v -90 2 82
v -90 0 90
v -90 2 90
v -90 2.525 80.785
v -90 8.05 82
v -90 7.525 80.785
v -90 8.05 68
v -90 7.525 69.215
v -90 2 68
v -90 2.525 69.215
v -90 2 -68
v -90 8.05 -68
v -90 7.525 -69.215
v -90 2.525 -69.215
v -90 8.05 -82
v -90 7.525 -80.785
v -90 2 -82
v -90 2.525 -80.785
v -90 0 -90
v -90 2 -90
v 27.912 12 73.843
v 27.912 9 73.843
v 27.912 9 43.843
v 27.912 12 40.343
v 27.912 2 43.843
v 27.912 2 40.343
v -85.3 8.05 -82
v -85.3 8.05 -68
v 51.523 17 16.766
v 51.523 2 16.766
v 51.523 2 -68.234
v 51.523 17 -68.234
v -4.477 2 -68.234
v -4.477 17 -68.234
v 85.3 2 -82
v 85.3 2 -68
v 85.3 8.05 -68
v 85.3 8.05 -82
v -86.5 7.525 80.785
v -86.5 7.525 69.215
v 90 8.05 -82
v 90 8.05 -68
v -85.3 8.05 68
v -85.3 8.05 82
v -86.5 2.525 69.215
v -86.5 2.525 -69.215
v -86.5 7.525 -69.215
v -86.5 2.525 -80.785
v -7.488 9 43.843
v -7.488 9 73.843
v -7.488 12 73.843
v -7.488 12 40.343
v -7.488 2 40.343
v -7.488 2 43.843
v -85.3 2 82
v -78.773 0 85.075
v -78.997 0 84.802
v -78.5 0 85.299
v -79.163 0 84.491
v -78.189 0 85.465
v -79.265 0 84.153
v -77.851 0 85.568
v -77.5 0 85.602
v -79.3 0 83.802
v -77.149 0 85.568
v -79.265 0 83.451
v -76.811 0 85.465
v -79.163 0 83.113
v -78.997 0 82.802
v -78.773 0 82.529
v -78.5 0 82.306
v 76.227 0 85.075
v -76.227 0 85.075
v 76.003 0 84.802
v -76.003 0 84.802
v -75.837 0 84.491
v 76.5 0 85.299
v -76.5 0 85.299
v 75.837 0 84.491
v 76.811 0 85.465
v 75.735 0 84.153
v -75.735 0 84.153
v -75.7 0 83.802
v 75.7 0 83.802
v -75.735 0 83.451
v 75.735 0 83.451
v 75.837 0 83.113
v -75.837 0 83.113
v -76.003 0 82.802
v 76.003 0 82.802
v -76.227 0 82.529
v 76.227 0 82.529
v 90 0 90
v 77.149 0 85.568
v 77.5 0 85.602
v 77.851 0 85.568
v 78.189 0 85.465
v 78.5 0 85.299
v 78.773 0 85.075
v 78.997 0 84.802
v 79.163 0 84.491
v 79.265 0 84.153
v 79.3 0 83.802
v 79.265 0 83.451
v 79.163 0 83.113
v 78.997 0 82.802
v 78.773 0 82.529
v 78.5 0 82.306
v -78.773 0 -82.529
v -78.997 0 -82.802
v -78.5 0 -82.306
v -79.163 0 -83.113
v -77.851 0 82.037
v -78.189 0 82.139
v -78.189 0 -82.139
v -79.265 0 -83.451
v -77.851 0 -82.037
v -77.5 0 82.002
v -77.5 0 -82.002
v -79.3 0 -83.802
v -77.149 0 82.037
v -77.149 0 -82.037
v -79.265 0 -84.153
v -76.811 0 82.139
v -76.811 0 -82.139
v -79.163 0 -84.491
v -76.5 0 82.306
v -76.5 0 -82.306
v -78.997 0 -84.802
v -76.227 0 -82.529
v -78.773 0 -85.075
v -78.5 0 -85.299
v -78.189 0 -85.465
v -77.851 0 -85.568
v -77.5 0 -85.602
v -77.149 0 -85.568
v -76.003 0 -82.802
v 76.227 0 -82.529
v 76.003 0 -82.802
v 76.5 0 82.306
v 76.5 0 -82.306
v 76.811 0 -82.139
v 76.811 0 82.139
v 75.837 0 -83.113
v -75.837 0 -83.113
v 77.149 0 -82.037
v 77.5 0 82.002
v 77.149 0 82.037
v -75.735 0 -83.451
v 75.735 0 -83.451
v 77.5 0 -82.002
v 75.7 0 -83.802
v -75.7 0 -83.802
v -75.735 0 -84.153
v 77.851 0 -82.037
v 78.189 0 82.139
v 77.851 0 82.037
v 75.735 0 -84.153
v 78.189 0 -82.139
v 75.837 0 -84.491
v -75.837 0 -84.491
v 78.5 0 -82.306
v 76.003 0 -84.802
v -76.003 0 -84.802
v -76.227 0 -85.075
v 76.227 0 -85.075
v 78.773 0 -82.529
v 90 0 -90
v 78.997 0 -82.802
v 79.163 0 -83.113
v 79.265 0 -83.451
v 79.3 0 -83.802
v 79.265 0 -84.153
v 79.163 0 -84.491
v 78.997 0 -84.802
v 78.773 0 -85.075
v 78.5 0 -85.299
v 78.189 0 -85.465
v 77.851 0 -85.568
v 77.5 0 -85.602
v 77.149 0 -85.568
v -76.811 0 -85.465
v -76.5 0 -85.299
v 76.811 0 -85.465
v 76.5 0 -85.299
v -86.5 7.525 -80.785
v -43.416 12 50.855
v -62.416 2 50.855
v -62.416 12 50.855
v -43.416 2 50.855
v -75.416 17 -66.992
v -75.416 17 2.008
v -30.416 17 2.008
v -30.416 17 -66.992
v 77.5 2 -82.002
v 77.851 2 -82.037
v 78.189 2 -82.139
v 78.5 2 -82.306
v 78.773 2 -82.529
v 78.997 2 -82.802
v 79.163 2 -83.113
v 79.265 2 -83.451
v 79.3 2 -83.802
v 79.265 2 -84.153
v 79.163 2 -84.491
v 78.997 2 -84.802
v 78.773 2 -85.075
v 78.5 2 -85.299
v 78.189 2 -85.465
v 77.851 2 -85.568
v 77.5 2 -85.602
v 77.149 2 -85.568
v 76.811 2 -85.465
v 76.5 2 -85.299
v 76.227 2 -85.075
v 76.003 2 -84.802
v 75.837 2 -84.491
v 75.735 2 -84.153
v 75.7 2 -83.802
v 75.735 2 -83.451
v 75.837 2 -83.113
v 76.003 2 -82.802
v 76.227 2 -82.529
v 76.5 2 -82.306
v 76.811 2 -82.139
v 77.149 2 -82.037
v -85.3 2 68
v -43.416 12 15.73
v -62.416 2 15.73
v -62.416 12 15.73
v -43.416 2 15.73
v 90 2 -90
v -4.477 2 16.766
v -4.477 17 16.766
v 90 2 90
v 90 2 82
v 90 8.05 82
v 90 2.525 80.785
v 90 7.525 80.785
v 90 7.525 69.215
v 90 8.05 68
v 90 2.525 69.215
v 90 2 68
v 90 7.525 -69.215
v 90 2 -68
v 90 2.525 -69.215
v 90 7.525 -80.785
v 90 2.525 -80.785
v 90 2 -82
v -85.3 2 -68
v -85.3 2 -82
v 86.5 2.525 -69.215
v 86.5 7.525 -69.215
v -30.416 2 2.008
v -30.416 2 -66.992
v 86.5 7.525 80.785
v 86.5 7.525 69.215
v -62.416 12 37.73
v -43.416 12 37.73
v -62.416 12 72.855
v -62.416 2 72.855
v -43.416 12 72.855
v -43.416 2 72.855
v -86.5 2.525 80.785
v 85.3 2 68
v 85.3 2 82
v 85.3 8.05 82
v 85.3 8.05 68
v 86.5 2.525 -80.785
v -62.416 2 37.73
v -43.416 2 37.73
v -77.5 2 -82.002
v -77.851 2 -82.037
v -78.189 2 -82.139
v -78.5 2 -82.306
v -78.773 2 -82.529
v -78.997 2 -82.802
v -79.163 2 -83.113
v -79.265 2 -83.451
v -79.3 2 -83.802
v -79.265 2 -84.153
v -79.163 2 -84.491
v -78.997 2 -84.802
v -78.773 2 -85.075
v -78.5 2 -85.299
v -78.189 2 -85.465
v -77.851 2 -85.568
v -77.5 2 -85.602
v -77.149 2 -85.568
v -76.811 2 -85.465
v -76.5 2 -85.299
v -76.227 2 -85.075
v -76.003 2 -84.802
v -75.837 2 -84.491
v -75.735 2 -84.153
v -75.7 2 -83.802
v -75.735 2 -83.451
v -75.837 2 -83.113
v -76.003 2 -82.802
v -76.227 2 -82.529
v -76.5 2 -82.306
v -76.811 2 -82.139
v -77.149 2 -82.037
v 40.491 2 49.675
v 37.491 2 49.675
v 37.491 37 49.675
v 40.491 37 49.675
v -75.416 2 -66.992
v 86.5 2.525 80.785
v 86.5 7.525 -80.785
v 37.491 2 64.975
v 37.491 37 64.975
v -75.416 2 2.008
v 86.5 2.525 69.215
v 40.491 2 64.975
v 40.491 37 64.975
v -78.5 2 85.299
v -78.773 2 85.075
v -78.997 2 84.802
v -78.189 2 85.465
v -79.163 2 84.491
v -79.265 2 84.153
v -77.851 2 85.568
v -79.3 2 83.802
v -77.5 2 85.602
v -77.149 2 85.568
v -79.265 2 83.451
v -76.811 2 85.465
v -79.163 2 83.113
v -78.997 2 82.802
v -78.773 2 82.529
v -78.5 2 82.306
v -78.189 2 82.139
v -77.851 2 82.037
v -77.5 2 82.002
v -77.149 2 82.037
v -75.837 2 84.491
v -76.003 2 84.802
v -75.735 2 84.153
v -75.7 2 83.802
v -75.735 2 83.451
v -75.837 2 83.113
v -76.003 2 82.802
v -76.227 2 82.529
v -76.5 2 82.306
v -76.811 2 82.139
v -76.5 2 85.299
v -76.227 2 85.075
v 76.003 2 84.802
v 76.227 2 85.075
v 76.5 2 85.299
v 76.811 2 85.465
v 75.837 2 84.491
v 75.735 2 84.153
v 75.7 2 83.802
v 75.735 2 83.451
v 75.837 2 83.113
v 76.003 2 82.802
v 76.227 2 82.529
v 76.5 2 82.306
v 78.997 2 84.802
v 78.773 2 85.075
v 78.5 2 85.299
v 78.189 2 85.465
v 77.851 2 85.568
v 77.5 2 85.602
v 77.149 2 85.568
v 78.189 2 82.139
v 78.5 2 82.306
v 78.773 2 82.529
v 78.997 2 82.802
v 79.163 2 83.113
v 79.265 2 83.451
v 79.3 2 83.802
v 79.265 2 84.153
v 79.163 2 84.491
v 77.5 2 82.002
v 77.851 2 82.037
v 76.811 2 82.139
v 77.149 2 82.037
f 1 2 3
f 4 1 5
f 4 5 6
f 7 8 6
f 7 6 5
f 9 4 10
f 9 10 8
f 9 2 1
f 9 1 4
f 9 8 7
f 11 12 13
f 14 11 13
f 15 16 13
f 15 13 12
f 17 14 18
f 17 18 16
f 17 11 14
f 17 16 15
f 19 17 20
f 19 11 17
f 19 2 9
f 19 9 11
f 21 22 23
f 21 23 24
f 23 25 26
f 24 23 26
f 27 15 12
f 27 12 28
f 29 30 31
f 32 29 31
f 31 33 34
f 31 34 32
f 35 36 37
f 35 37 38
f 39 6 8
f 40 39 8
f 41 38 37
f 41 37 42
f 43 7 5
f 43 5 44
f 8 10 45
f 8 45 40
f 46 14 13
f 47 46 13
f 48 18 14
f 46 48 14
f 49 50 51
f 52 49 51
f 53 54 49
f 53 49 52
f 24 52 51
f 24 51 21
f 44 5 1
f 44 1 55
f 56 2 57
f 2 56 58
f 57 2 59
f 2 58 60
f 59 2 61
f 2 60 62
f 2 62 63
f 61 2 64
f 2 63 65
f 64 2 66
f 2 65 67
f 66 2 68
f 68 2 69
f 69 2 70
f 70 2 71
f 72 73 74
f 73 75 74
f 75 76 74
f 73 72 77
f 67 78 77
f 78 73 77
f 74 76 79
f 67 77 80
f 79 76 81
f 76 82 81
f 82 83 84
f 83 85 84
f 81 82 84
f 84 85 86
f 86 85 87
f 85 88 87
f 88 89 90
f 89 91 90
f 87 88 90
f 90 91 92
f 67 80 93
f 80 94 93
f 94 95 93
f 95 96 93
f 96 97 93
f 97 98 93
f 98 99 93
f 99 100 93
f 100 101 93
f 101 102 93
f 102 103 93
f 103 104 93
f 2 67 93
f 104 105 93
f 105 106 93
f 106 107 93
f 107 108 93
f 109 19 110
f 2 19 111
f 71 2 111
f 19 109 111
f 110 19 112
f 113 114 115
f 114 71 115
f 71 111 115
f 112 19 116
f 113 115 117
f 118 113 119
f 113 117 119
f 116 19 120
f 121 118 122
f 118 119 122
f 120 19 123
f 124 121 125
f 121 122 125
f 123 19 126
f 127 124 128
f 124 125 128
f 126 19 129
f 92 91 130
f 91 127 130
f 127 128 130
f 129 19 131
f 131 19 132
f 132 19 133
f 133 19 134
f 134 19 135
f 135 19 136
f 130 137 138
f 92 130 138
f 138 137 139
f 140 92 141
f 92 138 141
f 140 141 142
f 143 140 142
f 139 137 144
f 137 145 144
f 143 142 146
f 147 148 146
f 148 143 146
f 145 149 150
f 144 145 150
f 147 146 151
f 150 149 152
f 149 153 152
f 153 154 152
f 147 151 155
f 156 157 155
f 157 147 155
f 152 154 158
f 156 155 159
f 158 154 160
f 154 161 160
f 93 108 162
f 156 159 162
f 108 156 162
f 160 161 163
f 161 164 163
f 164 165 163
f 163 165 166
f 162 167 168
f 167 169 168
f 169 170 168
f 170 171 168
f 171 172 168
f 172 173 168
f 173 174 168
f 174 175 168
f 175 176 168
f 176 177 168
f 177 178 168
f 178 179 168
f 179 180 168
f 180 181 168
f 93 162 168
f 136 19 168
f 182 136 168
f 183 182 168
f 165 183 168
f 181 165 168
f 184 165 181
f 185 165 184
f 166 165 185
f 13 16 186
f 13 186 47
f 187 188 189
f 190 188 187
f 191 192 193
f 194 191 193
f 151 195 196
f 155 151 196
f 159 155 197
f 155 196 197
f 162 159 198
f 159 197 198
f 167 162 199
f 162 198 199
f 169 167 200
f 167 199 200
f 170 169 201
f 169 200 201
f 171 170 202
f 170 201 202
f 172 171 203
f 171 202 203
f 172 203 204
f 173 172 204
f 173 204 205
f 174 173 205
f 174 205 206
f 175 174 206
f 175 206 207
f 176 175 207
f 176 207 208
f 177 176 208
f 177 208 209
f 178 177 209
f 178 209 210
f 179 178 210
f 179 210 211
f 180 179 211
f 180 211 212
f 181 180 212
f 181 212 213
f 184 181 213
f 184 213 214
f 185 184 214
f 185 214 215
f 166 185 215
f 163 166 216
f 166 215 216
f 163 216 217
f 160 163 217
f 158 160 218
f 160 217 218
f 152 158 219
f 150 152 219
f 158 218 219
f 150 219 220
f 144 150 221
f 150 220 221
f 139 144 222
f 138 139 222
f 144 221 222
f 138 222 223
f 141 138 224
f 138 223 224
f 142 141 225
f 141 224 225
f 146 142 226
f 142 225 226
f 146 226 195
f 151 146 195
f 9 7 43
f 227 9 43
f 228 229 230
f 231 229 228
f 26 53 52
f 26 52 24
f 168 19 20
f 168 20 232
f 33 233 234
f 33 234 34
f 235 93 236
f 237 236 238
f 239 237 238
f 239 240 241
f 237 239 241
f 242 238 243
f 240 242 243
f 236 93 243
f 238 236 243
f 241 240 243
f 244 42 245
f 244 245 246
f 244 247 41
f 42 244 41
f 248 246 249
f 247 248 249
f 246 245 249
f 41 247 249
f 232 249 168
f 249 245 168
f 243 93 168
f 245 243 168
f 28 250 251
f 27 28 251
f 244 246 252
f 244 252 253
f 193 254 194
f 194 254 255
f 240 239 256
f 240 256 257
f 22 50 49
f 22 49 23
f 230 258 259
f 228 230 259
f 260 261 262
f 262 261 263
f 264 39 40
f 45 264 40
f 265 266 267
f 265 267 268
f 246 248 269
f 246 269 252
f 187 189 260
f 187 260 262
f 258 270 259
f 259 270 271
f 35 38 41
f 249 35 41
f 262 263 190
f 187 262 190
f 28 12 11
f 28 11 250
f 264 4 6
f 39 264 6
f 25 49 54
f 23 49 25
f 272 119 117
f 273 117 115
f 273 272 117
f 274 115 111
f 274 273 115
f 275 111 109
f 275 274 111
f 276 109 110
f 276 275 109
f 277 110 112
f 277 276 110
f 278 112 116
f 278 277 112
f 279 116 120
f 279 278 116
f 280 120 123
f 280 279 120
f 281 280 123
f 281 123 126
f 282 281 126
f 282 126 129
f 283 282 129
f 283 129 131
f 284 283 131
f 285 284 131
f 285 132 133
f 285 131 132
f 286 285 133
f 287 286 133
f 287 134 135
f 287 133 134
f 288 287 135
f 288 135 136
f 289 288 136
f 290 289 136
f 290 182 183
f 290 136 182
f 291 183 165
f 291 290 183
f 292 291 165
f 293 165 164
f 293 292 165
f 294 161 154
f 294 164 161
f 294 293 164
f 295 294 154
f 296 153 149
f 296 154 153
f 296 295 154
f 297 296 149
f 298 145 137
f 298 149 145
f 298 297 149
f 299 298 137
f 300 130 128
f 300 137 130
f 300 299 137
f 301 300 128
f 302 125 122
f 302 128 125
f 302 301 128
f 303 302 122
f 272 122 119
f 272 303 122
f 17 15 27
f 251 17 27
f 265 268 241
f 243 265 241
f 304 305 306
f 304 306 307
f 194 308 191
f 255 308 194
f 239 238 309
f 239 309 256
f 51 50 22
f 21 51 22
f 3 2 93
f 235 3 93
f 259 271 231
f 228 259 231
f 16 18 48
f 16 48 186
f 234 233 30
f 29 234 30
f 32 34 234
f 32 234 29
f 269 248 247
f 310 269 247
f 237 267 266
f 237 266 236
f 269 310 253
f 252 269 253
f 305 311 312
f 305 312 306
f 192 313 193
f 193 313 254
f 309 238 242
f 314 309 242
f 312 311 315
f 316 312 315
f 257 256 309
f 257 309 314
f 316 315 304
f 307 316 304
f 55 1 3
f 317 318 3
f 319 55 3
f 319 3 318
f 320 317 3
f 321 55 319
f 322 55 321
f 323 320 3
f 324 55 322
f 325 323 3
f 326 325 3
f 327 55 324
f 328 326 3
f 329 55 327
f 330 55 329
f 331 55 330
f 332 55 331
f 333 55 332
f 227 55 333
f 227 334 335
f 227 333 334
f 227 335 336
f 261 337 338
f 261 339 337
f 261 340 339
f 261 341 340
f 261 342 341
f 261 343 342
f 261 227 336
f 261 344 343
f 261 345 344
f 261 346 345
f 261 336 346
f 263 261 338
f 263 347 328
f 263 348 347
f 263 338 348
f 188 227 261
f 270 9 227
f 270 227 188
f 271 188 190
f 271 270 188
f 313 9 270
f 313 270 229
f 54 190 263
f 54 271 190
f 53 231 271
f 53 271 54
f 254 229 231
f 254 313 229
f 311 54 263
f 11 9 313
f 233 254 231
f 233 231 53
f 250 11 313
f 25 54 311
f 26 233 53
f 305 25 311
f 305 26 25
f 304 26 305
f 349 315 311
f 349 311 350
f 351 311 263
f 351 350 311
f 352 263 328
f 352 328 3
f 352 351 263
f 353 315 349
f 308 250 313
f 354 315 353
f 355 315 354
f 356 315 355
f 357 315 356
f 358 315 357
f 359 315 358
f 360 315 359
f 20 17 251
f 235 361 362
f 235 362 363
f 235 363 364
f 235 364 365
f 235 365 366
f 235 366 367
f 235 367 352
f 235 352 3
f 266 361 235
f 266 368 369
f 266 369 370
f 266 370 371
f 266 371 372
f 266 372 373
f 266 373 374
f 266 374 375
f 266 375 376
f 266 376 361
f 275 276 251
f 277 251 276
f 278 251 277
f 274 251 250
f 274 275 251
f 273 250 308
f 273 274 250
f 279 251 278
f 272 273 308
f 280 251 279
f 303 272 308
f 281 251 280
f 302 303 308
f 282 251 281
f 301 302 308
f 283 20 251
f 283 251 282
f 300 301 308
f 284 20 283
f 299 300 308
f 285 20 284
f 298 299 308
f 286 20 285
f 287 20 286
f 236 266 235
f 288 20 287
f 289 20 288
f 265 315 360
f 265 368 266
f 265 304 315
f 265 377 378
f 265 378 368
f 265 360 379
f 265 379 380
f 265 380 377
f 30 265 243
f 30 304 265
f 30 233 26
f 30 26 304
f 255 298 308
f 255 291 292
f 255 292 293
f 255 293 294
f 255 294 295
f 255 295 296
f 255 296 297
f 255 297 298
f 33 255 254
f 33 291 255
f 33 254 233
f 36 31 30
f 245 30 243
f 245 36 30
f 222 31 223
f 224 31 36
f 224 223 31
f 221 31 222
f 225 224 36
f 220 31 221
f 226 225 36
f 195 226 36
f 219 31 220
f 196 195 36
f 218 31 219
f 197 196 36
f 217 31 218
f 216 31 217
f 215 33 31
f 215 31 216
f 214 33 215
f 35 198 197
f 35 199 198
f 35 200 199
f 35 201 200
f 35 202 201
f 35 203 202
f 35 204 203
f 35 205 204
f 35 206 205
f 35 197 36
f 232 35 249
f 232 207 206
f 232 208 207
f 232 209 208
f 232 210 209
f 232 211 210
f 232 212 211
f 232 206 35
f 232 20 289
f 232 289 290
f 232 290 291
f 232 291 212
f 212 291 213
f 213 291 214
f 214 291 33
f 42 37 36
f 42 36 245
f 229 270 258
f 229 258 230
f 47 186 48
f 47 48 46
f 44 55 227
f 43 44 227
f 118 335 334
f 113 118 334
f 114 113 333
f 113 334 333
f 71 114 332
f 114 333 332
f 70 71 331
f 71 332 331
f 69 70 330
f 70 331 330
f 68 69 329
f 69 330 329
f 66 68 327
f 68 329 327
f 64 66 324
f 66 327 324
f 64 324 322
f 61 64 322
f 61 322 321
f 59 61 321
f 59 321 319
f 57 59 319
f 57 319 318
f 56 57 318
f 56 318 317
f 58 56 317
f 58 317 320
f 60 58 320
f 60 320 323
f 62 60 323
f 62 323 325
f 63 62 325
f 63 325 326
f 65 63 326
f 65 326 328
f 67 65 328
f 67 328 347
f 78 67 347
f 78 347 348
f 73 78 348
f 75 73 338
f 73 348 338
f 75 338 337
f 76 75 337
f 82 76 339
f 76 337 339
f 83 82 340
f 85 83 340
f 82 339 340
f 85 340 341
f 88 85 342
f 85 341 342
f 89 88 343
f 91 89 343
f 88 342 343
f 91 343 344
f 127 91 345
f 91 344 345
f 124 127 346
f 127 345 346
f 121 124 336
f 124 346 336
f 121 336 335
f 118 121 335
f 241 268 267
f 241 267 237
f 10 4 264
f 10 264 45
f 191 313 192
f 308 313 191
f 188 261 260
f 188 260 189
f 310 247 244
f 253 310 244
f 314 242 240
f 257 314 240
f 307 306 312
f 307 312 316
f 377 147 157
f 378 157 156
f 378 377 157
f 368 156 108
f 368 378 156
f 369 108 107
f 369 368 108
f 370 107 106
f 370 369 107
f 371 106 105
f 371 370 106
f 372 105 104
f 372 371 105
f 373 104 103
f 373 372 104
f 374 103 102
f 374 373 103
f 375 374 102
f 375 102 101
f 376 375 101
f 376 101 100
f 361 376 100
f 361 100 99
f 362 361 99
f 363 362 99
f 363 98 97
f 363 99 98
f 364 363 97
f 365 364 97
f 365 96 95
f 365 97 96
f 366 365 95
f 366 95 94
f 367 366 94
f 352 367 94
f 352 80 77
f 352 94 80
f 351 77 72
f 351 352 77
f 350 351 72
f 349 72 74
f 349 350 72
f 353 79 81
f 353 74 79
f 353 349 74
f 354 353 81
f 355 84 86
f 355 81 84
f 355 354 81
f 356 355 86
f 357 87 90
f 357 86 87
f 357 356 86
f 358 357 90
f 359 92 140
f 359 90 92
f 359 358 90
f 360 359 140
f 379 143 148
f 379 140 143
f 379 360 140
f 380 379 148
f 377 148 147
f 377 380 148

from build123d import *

# Parameters (mm, degrees)
SKETCH_1_W                                 = 180
SKETCH_1_H                                 = 180
EXTRUDE_1_DEPTH                            = 2
SKETCH_2_W                                 = 4.7
SKETCH_2_H                                 = 14
EXTRUDE_2_DEPTH                            = 6.05
SKETCH_3_W                                 = 11.570247934
SKETCH_3_H                                 = 5
CUT_EXTRUDE_1_DEPTH                        = 3.5
MIRROR_1_AT_THE_SECOND_PLANE_COPY_1_SKET_W = 11.570247934
MIRROR_1_AT_THE_SECOND_PLANE_COPY_1_SKET_H = 5
MIRROR_1_AT_THE_SECOND_PLANE_COPY_1_DEPTH  = 3.5
SKETCH_4_W                                 = 45
SKETCH_4_H                                 = 69
EXTRUDE_3_DEPTH                            = 15
SKETCH_5_W                                 = 19
SKETCH_5_H                                 = 22
EXTRUDE_4_DEPTH                            = 10
SKETCH_6_W                                 = 56
SKETCH_6_H                                 = 85
EXTRUDE_5_DEPTH                            = 15
SKETCH_7_W                                 = 35.4
SKETCH_7_H                                 = 33.5
EXTRUDE_6_DEPTH                            = 10
SKETCH_8_W                                 = 35.4
SKETCH_8_H                                 = 7
CUT_EXTRUDE_6_DEPTH                        = 30
SKETCH_9_W                                 = 3
SKETCH_9_H                                 = 15.3
EXTRUDE_7_DEPTH                            = 35
SKETCH_10_R                                = 1.8
CUT_EXTRUDE_7_DEPTH                        = 10
MIRROR_3_AT_THE_SECOND_PLANE_COPY_1_SKET_R = 1.8
MIRROR_3_AT_THE_SECOND_PLANE_COPY_1_DEPTH  = 10


with BuildPart() as part:
    # 草图1 → 凸台-拉伸1 (new body)
    with BuildSketch(Plane(origin=(0, 0, 0), x_dir=(1, 0, 0), z_dir=(0, 1, 0))):
        Rectangle(SKETCH_1_W, SKETCH_1_H)
    extrude(amount=EXTRUDE_1_DEPTH)

    # 草图2 → 凸台-拉伸2 (add)
    with BuildSketch(Plane(origin=(0, 2, 0), x_dir=(1, 0, 0), z_dir=(0, 1, 0))):
        with Locations((-87.65, 75)):
            Rectangle(SKETCH_2_W, SKETCH_2_H)
        with Locations((-87.65, -75)):
            Rectangle(SKETCH_2_W, SKETCH_2_H)
        with Locations((87.65, -75)):
            Rectangle(SKETCH_2_W, SKETCH_2_H)
        with Locations((87.65, 75)):
            Rectangle(SKETCH_2_W, SKETCH_2_H)
    extrude(amount=EXTRUDE_2_DEPTH)

    # 草图3 → 切除-拉伸1 (cut)
    with BuildSketch(Plane.ZY.offset(90)):
        with Locations((-75, 5.025)):
            Rectangle(SKETCH_3_W, SKETCH_3_H)
    cut_extrude_1 = extrude(amount=-CUT_EXTRUDE_1_DEPTH, mode=Mode.SUBTRACT)

    # 镜向1: 切除-拉伸1 across plane
    add(cut_extrude_1.mirror(Plane(origin=(0, 0, 0), x_dir=(0, 0, 1), z_dir=(1, 0, 0))), mode=Mode.SUBTRACT)

    # 镜向1 at the second plane: 切除-拉伸1 across plane
    add(cut_extrude_1.mirror(Plane.XY), mode=Mode.SUBTRACT)

    # 镜向1 at the second plane copy 1 sket → 镜向1 at the second plane copy 1 (cut)
    with BuildSketch(Plane(origin=(90, 0, 0), x_dir=(0, 0, -1), z_dir=(1, 0, 0))):
        with Locations((-75, 5.025)):
            Rectangle(MIRROR_1_AT_THE_SECOND_PLANE_COPY_1_SKET_W, MIRROR_1_AT_THE_SECOND_PLANE_COPY_1_SKET_H)
    extrude(amount=-MIRROR_1_AT_THE_SECOND_PLANE_COPY_1_DEPTH, mode=Mode.SUBTRACT)

    # 草图4 → 凸台-拉伸3 (add)
    with BuildSketch(Plane(origin=(0, 2, 0), x_dir=(1, 0, 0), z_dir=(0, 1, 0))):
        with Locations((-52.915832737, 32.492177997)):
            Rectangle(SKETCH_4_W, SKETCH_4_H)
    extrude(amount=EXTRUDE_3_DEPTH)

    # 草图5 → 凸台-拉伸4 (add)
    with BuildSketch(Plane(origin=(0, 2, 0), x_dir=(1, 0, 0), z_dir=(0, 1, 0))):
        with Locations((-52.915832737, -26.729978553)):
            Rectangle(SKETCH_5_W, SKETCH_5_H)
        with Locations((-52.915832737, -61.854870093)):
            Rectangle(SKETCH_5_W, SKETCH_5_H)
    extrude(amount=EXTRUDE_4_DEPTH)

    # 草图6 → 凸台-拉伸5 (add)
    with BuildSketch(Plane(origin=(0, 2, 0), x_dir=(1, 0, 0), z_dir=(0, 1, 0))):
        with Locations((23.523310823, 25.733573793)):
            Rectangle(SKETCH_6_W, SKETCH_6_H)
    extrude(amount=EXTRUDE_5_DEPTH)

    # 草图7 → 凸台-拉伸6 (add)
    with BuildSketch(Plane(origin=(0, 2, 0), x_dir=(1, 0, 0), z_dir=(0, 1, 0))):
        with Locations((10.21182737, -57.09339848)):
            Rectangle(SKETCH_7_W, SKETCH_7_H)
    extrude(amount=EXTRUDE_6_DEPTH)

    # 草图8 → 切除-拉伸6 (cut)
    with BuildSketch(Plane.XY.offset(73.84339848)):
        with Locations((10.21182737, 5.5)):
            Rectangle(SKETCH_8_W, SKETCH_8_H)
    extrude(amount=-CUT_EXTRUDE_6_DEPTH, mode=Mode.SUBTRACT)

    # 草图9 → 凸台-拉伸7 (add)
    with BuildSketch(Plane(origin=(0, 2, 0), x_dir=(1, 0, 0), z_dir=(0, 1, 0))):
        with Locations((38.990613596, -57.325485465)):
            Rectangle(SKETCH_9_W, SKETCH_9_H)
    extrude(amount=EXTRUDE_7_DEPTH)

    # 草图10 → 切除-拉伸7 (cut)
    with BuildSketch(Plane(origin=(0, 2, 0), x_dir=(1, 0, 0), z_dir=(0, 1, 0))):
        with Locations(Location((77.5, 83.802246308, 0), (0, 0, 270))):
            Circle(SKETCH_10_R)
    cut_extrude_7 = extrude(amount=-CUT_EXTRUDE_7_DEPTH, mode=Mode.SUBTRACT)

    # 镜向3: 切除-拉伸7 across plane
    add(cut_extrude_7.mirror(Plane(origin=(0, 0, 0), x_dir=(0, 0, 1), z_dir=(1, 0, 0))), mode=Mode.SUBTRACT)

    # 镜向3 at the second plane: 切除-拉伸7 across plane
    add(cut_extrude_7.mirror(Plane.XY), mode=Mode.SUBTRACT)

    # 镜向3 at the second plane copy 1 sket → 镜向3 at the second plane copy 1 (cut)
    with BuildSketch(Plane(origin=(0, 2, 0), x_dir=(-1, 0, 0), z_dir=(0, 1, 0))):
        with Locations(Location((77.5, 83.802246308, 0), (0, 0, 270))):
            Circle(MIRROR_3_AT_THE_SECOND_PLANE_COPY_1_SKET_R)
    extrude(amount=-MIRROR_3_AT_THE_SECOND_PLANE_COPY_1_DEPTH, mode=Mode.SUBTRACT)


solid = part.part
